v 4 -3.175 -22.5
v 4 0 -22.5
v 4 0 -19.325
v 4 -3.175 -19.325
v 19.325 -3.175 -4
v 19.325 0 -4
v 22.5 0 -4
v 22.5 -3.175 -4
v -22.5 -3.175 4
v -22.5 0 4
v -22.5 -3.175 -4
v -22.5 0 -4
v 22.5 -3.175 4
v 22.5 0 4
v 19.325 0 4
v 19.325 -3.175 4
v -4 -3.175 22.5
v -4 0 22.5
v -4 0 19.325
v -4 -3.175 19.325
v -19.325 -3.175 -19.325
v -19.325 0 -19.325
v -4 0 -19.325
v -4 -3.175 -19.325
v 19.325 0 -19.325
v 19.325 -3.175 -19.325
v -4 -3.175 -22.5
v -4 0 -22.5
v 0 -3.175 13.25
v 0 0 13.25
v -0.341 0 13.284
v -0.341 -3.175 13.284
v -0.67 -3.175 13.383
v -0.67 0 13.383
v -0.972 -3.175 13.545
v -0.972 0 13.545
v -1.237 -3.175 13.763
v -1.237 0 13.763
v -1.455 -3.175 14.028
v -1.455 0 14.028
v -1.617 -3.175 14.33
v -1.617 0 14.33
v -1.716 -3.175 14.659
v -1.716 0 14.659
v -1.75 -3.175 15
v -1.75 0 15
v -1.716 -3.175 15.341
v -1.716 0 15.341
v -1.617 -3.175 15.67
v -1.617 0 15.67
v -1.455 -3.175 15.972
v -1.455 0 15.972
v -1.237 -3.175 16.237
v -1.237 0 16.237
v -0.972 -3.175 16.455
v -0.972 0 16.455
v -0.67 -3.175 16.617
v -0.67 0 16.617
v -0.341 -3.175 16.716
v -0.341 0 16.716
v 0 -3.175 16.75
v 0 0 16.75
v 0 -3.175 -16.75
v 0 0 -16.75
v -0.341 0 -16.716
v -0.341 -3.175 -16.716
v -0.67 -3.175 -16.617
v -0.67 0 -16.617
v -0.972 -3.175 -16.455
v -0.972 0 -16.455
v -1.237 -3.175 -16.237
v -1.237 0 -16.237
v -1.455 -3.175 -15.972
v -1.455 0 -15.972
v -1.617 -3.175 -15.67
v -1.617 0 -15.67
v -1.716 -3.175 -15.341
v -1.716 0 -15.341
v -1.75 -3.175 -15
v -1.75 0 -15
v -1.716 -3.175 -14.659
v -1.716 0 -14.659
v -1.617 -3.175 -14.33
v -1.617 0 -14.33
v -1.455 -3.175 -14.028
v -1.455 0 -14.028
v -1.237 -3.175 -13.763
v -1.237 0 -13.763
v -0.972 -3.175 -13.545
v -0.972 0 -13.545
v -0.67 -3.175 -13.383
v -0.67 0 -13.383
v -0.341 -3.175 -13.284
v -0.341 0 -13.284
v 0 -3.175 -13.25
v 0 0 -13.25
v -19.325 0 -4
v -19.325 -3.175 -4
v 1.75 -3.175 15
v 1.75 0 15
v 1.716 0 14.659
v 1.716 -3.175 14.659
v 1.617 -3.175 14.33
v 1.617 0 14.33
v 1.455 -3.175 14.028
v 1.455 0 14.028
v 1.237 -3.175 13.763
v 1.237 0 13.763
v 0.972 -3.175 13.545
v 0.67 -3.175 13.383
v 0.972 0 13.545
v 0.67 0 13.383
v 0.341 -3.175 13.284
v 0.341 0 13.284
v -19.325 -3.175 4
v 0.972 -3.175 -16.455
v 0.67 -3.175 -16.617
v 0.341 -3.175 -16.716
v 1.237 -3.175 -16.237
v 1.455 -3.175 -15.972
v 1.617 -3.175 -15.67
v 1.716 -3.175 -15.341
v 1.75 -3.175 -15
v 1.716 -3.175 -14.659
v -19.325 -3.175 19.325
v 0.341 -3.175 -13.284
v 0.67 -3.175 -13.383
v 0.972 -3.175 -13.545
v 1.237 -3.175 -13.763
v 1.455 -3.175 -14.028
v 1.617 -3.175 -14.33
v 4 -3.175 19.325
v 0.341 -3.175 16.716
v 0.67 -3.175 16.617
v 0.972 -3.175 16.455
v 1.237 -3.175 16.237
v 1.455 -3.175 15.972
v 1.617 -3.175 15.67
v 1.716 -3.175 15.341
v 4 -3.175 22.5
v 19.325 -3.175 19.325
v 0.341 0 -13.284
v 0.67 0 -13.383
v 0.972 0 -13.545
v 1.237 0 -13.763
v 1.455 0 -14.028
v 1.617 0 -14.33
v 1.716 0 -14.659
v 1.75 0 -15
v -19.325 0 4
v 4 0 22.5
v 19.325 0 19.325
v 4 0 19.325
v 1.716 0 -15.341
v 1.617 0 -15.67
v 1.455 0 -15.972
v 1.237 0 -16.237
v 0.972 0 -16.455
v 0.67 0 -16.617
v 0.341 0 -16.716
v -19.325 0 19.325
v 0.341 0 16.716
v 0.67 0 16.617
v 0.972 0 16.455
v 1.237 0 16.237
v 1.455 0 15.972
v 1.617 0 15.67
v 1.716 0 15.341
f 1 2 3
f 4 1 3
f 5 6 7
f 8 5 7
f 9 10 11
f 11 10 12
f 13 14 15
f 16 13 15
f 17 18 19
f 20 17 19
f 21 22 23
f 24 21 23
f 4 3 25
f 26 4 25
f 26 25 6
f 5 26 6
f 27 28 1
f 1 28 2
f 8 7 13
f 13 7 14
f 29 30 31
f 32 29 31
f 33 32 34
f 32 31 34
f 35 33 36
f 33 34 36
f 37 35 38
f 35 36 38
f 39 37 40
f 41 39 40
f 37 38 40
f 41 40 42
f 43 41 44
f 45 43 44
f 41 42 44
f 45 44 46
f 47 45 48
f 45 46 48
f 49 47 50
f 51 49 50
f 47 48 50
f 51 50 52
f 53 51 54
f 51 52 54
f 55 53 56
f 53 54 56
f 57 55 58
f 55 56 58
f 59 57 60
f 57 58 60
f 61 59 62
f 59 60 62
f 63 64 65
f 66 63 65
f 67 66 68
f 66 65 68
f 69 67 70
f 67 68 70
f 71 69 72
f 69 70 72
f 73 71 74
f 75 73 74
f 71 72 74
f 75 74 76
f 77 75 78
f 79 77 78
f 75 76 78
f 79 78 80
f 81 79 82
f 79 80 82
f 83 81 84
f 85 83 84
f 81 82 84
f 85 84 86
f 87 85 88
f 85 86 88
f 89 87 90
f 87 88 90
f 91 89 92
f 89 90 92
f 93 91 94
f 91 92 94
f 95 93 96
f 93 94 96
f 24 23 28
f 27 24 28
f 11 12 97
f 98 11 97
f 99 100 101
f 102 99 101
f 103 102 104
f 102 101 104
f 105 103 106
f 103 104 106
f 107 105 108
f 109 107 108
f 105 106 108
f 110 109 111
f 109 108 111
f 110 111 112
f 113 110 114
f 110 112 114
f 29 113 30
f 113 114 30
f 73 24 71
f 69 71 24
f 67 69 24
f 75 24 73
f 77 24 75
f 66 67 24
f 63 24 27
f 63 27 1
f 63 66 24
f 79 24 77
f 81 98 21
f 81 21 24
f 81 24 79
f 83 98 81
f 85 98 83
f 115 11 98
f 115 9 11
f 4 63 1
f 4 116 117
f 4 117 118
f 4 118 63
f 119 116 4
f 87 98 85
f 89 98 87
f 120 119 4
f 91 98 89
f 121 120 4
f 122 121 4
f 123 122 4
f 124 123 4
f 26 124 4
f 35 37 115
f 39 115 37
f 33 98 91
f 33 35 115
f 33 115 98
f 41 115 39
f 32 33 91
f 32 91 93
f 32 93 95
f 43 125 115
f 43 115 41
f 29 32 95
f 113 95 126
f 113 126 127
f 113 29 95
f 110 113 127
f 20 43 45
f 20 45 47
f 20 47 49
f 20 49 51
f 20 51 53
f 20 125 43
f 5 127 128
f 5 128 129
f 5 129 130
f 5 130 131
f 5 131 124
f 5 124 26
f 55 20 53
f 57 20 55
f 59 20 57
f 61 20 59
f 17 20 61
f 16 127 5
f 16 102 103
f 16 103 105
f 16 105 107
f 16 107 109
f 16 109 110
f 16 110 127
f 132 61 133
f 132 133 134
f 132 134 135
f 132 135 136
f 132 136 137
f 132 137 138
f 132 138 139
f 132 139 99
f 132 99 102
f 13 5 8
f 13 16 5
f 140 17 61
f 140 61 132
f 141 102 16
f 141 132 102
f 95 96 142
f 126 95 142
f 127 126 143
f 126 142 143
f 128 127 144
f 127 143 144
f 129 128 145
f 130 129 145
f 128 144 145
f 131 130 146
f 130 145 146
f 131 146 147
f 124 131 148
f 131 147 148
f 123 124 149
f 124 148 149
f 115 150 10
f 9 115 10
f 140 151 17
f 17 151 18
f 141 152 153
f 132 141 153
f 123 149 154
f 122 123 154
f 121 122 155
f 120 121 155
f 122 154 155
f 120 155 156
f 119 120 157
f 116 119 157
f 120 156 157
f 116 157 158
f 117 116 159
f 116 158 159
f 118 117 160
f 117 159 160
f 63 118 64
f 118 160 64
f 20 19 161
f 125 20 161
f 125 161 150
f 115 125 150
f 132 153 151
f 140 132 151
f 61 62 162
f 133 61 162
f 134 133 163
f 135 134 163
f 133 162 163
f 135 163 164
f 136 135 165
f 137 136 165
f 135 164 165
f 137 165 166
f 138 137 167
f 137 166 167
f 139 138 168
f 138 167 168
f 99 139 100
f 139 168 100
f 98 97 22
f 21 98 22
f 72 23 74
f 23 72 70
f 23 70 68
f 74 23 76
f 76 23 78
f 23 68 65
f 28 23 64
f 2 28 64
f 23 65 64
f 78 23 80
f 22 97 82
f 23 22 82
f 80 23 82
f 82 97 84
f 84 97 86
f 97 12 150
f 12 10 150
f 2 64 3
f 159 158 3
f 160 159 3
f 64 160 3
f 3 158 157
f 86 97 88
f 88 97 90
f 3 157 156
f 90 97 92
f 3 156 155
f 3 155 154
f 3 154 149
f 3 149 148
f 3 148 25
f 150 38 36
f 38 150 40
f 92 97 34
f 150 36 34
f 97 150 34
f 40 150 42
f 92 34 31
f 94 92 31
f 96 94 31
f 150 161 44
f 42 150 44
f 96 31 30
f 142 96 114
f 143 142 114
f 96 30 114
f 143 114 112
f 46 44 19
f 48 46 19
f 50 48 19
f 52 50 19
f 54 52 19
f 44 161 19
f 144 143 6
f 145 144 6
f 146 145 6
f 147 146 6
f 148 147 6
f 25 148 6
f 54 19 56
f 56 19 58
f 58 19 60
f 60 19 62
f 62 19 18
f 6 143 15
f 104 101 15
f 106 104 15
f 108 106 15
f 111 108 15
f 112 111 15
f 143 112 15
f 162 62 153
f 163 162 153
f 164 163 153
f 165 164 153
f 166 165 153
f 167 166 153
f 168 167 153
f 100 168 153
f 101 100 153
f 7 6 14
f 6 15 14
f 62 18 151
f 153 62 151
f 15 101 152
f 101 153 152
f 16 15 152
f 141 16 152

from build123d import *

# Parameters (mm, degrees)
F1_DEPTH = 3.175


# Not quite as in the source:
# - a length typed as a fraction of an inch, garbled in the dataset ("3 / 203.2 mm" for 3/8 in), is restored


with BuildPart() as f1:
    # F0 (on Front) → F1 (new body)
    with BuildSketch(Plane.XZ):
        Polygon((-22.5, -4), (-19.325, -4), (-19.325, -19.325), (-4, -19.325), (-4, -22.5), (0, -22.5), (0, -18), (-18, -18), (-18, 0), (-22.5, 0), align=None)
        Polygon((-22.5, 4), (-22.5, 0), (-18, 0), (-18, 18), (0, 18), (0, 22.5), (-4, 22.5), (-4, 19.325), (-19.325, 19.325), (-19.325, 4), align=None)
        Polygon((0, -18), (0, -22.5), (4, -22.5), (4, -19.325), (19.325, -19.325), (19.325, -4), (22.5, -4), (22.5, 0), (18, 0), (18, -18), align=None)
        Polygon((18, 18), (18, 0), (22.5, 0), (22.5, 4), (19.325, 4), (19.325, 19.325), (4, 19.325), (4, 22.5), (0, 22.5), (0, 18), align=None)
        with BuildLine():
            Line((-18, 18), (-18, 0))
            Line((-18, 0), (0, 0))
            Line((0, 0), (0, 13.25))
            ThreePointArc((0, 13.25), (-1.75, 15), (0, 16.75))
            Line((0, 16.75), (0, 18))
            Line((0, 18), (-18, 18))
        make_face()
        with BuildLine():
            Line((0, 13.25), (0, 0))
            Line((0, 0), (18, 0))
            Line((18, 0), (18, 18))
            Line((18, 18), (0, 18))
            Line((0, 18), (0, 16.75))
            ThreePointArc((0, 16.75), (1.2374368671, 16.2374368671), (1.75, 15))
            ThreePointArc((1.75, 15), (1.2374368671, 13.7625631329), (0, 13.25))
        make_face()
        with BuildLine():
            Line((18, 0), (0, 0))
            Line((0, 0), (0, -13.25))
            ThreePointArc((0, -13.25), (1.2374368671, -13.7625631329), (1.75, -15))
            ThreePointArc((1.75, -15), (1.2374368671, -16.2374368671), (0, -16.75))
            Line((0, -16.75), (0, -18))
            Line((0, -18), (18, -18))
            Line((18, -18), (18, 0))
        make_face()
        with BuildLine():
            Line((0, 0), (-18, 0))
            Line((-18, 0), (-18, -18))
            Line((-18, -18), (0, -18))
            Line((0, -18), (0, -16.75))
            ThreePointArc((0, -16.75), (-1.75, -15), (0, -13.25))
            Line((0, -13.25), (0, 0))
        make_face()
    extrude(amount=F1_DEPTH)


solid = f1.part
